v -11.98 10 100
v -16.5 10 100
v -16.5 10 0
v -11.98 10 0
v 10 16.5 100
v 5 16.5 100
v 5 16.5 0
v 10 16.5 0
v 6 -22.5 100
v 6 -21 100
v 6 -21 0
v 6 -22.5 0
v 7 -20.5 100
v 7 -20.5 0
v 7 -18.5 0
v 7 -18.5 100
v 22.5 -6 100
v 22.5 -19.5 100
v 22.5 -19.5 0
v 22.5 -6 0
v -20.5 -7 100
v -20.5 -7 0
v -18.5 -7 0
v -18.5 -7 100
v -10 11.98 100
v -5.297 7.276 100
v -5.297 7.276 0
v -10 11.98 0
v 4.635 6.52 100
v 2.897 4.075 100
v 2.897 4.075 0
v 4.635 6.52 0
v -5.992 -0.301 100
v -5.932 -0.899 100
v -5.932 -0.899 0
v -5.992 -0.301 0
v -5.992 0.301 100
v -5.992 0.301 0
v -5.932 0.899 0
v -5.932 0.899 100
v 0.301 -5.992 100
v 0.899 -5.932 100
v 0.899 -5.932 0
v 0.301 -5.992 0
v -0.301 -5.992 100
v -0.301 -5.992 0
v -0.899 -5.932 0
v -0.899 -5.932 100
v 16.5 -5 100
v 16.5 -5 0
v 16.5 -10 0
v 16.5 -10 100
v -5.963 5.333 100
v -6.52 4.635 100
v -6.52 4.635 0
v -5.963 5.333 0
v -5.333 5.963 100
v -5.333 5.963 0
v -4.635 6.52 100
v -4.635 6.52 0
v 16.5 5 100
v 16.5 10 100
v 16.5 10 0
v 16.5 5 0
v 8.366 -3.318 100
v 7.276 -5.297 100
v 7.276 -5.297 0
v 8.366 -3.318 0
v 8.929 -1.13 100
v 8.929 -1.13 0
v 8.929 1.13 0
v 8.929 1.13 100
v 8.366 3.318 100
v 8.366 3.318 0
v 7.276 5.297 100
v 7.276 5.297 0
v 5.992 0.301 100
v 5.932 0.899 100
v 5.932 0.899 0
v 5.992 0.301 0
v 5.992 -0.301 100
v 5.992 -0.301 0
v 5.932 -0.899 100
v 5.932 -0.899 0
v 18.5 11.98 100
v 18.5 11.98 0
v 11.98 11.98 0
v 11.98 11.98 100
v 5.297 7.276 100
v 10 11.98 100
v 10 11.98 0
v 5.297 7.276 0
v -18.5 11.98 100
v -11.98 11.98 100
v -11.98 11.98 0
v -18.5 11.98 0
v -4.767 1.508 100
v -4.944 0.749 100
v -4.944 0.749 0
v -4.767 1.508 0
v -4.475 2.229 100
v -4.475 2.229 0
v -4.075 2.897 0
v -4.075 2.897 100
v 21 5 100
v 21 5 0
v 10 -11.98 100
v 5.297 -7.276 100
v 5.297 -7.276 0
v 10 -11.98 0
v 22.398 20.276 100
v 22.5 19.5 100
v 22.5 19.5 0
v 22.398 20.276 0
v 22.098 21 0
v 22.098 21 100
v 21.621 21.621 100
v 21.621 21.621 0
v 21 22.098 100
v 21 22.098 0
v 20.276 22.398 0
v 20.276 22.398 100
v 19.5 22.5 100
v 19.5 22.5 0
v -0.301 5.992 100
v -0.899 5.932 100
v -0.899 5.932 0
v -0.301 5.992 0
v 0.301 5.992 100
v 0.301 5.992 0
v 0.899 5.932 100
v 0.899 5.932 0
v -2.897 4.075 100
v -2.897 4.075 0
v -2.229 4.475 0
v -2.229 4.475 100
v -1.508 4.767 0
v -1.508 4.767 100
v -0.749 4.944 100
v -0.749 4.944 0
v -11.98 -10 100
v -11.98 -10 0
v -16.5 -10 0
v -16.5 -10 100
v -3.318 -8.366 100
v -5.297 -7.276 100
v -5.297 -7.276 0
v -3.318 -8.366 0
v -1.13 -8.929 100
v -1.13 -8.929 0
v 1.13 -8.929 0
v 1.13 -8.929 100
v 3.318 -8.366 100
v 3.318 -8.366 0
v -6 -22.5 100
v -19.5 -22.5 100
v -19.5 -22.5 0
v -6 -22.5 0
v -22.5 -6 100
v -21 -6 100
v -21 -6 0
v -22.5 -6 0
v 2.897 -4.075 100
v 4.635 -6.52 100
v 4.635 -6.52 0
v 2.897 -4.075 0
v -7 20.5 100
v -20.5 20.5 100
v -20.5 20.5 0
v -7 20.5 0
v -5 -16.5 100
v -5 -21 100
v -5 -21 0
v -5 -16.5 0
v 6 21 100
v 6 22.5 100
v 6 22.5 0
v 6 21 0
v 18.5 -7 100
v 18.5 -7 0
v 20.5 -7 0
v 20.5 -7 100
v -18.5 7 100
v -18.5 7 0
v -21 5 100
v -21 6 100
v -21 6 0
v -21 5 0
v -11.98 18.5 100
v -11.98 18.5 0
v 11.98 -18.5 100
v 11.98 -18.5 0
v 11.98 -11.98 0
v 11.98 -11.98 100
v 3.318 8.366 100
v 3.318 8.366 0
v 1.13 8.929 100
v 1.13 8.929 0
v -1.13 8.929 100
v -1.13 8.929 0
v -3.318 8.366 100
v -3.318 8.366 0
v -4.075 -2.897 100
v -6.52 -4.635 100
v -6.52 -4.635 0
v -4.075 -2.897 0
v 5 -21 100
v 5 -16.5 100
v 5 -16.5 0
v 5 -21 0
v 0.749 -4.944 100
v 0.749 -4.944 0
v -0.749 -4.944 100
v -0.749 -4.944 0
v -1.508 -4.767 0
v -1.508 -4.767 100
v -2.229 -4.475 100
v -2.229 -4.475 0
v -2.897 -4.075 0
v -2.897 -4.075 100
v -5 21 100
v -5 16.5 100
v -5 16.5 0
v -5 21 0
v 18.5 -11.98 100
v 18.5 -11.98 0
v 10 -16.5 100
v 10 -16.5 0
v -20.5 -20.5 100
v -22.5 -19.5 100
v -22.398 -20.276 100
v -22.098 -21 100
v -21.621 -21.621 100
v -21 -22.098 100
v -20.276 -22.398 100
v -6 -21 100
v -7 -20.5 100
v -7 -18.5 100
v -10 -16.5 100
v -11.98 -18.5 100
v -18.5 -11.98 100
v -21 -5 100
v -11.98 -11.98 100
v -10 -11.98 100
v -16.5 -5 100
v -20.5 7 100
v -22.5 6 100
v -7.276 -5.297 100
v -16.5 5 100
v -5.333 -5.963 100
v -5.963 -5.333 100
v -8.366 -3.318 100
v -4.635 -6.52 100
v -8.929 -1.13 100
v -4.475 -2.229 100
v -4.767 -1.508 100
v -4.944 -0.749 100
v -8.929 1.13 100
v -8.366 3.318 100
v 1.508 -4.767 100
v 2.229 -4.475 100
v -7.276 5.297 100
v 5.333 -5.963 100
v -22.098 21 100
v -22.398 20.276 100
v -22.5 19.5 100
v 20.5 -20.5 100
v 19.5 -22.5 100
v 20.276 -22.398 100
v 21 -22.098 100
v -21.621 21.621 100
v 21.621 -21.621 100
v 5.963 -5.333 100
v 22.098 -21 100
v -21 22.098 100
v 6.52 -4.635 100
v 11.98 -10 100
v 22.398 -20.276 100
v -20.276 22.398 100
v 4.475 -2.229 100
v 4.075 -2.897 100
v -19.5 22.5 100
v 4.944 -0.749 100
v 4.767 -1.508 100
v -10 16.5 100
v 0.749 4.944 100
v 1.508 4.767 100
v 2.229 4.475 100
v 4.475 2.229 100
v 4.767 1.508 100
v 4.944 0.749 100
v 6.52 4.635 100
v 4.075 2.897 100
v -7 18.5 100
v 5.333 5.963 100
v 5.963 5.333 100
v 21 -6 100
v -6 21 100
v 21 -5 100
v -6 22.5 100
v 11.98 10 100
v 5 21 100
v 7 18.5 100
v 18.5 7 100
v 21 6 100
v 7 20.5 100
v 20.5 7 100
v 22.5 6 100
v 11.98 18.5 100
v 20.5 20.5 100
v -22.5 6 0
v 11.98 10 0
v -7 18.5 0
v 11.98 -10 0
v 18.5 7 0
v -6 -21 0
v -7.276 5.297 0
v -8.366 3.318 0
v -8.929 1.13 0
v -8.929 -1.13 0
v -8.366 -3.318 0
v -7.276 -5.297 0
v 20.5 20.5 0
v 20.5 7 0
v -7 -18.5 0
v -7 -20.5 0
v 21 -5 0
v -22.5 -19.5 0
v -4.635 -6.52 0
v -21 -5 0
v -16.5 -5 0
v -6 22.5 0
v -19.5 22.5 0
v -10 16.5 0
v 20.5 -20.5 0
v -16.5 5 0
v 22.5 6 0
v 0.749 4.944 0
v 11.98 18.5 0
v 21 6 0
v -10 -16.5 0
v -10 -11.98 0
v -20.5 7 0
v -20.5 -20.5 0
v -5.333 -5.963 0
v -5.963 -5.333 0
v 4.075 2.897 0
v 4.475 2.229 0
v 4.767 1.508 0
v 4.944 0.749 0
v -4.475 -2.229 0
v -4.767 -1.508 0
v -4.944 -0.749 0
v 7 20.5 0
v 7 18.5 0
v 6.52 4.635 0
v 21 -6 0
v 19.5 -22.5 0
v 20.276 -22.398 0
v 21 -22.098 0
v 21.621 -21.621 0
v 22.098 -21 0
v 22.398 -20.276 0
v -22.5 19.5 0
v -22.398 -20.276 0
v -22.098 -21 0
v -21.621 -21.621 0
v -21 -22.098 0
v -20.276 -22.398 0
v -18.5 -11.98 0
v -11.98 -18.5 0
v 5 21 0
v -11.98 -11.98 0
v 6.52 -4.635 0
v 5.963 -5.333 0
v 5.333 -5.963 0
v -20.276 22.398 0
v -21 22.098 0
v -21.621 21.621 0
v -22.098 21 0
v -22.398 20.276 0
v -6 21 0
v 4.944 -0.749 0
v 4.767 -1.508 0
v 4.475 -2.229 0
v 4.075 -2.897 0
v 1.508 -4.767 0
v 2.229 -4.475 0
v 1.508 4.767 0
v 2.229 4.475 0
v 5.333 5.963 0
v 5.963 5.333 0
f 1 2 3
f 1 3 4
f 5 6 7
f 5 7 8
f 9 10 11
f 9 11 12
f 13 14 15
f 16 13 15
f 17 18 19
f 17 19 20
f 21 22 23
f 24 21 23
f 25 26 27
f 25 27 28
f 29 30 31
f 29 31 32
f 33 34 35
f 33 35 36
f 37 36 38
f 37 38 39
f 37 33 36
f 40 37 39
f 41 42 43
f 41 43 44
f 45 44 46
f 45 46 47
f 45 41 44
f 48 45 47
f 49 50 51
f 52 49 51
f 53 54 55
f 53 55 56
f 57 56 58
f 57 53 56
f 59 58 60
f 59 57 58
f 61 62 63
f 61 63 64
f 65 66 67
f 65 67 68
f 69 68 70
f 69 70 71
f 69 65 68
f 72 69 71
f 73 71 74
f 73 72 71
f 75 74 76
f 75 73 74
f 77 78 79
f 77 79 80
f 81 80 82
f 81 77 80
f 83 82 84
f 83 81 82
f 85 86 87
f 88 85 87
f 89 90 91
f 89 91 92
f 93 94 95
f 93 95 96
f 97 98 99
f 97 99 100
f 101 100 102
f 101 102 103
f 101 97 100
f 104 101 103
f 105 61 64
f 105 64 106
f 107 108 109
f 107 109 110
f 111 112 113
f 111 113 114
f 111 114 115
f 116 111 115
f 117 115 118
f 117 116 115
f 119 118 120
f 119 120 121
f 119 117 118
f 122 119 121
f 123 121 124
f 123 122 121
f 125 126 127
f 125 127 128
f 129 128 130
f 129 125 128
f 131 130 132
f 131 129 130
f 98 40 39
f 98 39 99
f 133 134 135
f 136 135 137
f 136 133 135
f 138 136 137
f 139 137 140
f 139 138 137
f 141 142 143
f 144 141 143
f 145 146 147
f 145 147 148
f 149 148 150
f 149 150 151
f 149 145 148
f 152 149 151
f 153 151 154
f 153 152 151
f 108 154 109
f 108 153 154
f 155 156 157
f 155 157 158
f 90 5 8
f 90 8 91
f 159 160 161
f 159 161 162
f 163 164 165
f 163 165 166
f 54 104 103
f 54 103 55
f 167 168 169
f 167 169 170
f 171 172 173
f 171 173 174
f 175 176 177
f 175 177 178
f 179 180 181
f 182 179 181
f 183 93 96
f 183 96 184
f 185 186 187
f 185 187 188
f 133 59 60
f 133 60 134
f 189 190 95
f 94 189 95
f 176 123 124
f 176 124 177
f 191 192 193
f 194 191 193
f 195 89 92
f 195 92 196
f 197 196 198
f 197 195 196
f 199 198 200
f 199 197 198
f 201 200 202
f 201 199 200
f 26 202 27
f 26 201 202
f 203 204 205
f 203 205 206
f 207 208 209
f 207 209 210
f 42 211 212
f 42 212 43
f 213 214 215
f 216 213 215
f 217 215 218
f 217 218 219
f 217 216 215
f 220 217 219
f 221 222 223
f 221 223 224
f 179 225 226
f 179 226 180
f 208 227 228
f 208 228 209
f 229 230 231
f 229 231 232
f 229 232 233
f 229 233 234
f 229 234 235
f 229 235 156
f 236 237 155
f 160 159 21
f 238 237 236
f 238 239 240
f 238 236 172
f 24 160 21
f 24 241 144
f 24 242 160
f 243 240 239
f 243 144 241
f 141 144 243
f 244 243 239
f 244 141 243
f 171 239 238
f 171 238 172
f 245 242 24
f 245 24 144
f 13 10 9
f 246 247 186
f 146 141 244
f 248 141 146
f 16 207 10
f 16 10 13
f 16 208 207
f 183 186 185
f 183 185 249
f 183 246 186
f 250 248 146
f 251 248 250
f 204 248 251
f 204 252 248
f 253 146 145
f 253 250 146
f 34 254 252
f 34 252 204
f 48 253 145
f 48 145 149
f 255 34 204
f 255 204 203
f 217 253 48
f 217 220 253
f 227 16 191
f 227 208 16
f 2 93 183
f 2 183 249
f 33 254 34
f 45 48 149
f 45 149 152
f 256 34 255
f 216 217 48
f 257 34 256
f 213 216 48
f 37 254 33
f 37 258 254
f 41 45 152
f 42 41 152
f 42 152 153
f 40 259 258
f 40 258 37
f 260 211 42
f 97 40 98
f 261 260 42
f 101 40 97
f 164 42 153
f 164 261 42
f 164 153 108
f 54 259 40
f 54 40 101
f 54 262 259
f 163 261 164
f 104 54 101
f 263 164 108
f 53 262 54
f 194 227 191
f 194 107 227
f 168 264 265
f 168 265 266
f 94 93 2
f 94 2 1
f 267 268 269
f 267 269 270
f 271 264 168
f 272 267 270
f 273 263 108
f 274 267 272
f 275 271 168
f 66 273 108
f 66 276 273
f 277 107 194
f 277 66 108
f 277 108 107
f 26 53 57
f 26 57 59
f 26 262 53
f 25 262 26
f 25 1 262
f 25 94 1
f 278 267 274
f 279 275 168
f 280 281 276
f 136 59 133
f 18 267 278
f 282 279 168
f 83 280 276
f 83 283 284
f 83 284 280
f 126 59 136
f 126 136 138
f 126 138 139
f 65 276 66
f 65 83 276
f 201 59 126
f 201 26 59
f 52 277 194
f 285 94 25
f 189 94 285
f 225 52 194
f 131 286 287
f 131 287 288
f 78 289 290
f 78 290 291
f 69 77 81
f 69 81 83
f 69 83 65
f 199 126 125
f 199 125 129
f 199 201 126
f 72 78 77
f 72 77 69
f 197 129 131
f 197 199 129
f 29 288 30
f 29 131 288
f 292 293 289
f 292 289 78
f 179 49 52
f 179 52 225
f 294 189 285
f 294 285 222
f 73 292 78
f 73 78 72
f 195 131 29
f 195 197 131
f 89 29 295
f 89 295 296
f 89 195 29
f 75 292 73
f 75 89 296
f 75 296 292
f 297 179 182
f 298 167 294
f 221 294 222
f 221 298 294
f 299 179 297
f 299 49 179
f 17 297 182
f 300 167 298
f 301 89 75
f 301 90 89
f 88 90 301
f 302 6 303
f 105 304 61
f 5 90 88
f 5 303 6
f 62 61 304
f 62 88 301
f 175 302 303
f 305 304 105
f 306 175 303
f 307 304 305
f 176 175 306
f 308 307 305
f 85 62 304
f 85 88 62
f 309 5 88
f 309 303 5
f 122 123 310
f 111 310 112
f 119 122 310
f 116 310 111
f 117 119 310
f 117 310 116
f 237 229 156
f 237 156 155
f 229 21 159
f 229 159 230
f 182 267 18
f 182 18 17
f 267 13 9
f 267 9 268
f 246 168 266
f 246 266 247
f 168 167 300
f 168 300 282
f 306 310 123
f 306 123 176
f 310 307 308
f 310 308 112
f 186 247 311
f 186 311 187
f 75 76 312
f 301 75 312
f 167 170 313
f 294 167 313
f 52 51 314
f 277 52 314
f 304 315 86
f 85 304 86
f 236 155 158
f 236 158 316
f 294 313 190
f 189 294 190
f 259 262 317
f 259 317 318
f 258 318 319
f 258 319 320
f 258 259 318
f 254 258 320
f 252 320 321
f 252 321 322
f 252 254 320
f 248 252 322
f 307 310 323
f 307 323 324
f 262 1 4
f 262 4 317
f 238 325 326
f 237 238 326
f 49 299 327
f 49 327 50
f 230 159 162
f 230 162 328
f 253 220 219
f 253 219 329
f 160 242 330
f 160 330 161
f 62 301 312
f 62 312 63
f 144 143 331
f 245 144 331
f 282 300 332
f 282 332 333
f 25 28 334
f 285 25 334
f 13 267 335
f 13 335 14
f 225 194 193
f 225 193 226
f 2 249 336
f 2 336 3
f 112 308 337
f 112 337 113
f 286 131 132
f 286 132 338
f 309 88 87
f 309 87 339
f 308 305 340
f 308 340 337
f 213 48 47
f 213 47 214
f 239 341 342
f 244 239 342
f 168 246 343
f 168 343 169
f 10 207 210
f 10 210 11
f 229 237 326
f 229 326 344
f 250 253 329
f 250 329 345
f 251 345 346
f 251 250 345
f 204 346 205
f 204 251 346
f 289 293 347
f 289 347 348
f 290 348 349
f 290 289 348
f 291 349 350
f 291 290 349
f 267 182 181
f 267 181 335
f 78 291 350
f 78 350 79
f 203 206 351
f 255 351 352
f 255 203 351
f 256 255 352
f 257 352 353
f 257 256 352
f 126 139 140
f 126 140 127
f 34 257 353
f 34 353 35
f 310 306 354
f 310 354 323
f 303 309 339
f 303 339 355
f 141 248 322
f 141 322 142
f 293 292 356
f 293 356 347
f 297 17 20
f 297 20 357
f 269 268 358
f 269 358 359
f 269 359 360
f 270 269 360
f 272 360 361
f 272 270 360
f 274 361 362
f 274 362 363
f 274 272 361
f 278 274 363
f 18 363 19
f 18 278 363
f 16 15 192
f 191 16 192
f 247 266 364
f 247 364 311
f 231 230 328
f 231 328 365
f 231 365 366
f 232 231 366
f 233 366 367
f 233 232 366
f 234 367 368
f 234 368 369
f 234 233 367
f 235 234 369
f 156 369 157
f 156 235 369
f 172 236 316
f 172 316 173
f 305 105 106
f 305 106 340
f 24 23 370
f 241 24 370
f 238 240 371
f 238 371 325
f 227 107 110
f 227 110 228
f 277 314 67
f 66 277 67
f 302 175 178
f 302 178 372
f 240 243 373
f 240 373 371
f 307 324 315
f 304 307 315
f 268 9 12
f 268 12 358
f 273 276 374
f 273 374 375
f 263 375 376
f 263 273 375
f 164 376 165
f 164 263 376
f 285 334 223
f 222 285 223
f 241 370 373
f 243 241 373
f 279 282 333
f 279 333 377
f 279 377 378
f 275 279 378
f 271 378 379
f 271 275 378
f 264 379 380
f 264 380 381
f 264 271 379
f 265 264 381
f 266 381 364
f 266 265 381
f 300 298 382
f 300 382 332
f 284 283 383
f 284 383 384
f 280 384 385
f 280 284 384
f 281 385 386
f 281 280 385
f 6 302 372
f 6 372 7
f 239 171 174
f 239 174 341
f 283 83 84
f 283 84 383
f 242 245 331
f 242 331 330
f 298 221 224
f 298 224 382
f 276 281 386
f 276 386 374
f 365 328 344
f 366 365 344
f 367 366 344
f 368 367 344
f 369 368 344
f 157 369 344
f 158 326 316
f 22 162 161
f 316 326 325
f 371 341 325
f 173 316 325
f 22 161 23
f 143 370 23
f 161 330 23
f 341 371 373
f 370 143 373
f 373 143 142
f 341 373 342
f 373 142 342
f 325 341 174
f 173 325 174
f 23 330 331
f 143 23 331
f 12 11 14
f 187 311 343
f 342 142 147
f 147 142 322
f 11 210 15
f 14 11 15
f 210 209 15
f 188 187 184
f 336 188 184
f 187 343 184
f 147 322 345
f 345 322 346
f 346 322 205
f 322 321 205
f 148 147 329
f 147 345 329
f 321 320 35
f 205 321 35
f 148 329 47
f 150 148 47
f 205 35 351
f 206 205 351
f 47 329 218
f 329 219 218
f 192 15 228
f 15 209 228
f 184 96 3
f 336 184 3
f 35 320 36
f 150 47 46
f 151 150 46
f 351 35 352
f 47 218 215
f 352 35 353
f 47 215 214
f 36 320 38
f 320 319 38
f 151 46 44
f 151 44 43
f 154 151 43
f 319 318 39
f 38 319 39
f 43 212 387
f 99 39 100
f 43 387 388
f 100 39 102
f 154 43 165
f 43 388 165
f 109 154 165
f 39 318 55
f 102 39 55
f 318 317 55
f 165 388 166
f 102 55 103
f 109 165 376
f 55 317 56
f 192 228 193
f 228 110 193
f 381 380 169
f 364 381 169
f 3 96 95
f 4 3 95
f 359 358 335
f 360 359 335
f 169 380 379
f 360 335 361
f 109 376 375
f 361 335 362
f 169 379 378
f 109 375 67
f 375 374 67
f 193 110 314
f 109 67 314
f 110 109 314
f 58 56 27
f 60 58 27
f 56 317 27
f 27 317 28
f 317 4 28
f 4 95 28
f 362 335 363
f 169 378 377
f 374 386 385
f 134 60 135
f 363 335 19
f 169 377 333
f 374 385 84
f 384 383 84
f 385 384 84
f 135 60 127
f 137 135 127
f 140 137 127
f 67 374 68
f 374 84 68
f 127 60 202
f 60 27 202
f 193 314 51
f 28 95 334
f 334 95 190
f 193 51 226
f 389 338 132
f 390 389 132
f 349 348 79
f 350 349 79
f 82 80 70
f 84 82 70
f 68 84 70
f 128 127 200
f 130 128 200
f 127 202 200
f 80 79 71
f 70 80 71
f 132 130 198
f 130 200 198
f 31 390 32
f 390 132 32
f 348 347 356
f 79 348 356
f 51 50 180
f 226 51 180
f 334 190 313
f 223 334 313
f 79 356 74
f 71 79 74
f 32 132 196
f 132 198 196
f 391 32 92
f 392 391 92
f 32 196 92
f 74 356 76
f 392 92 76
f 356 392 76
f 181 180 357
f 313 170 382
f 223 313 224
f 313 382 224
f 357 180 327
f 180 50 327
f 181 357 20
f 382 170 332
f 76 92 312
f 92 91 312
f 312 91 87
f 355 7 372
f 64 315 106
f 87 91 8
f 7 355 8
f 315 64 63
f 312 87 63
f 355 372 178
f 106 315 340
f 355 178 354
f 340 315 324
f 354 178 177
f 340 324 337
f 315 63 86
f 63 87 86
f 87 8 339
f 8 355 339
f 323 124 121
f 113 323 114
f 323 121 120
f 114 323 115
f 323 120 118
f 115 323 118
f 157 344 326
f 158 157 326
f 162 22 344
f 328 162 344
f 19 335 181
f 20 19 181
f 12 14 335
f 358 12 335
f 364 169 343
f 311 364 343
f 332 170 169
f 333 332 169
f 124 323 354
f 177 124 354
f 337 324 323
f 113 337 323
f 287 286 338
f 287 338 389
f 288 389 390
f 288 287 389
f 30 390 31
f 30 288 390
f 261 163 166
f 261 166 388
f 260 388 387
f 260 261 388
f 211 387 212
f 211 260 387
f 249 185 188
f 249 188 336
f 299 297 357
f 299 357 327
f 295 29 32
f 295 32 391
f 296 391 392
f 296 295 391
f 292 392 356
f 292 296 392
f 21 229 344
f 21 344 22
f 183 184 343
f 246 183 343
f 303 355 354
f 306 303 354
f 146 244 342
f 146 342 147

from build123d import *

# Parameters (mm, degrees)
Y_KSEKLIK_EKSTR_ZYON1_DEPTH = 100


with BuildPart() as part:
    # Çizim1 → Yükseklik-Ekstrüzyon1 (new body)
    with BuildSketch(Plane.XY.offset(100)):
        with BuildLine():
            Line((5, -21), (6, -21))
            Line((6, -21), (6, -22.5))
            Line((6, -22.5), (19.5, -22.5))
            ThreePointArc((19.5, -22.5), (21.621320344, -21.621320344), (22.5, -19.5))
            Line((22.5, -19.5), (22.5, -6))
            Line((22.5, -6), (21, -6))
            Line((21, -6), (21, -5))
            Line((21, -5), (16.499999999, -5))
            Line((16.499999999, -5), (16.499999999, -10.000000002))
            Line((16.499999999, -10.000000002), (11.979898986, -10.000000002))
            Line((11.979898986, -10.000000002), (7.27644295, -5.296543966))
            ThreePointArc((7.27644295, -5.296543966), (8.999999998, -2e-09), (7.27644295, 5.296543963))
            Line((7.27644295, 5.296543963), (11.979898987, 10))
            Line((11.979898987, 10), (16.499999999, 10))
            Line((16.499999999, 10), (16.499999999, 5))
            Line((16.499999999, 5), (21, 5))
            Line((21, 5), (21, 6))
            Line((21, 6), (22.5, 6))
            Line((22.5, 6), (22.5, 19.5))
            ThreePointArc((22.5, 19.5), (21.621320344, 21.621320344), (19.5, 22.5))
            Line((19.5, 22.5), (6, 22.5))
            Line((6, 22.5), (6, 21))
            Line((6, 21), (5, 21))
            Line((5, 21), (5, 16.499999998))
            Line((5, 16.499999998), (10, 16.499999998))
            Line((10, 16.499999998), (10, 11.979898987))
            Line((10, 11.979898987), (5.296543963, 7.27644295))
            ThreePointArc((5.296543963, 7.27644295), (-2e-09, 8.999999998), (-5.296543966, 7.27644295))
            Line((-5.296543966, 7.27644295), (-10.000000001, 11.979898985))
            Line((-10.000000001, 11.979898985), (-10.000000001, 16.499999998))
            Line((-10.000000001, 16.499999998), (-5, 16.499999998))
            Line((-5, 16.499999998), (-5, 21))
            Line((-5, 21), (-6, 21))
            Line((-6, 21), (-6, 22.5))
            Line((-6, 22.5), (-19.5, 22.5))
            ThreePointArc((-19.5, 22.5), (-21.621320344, 21.621320344), (-22.5, 19.5))
            Line((-22.5, 19.5), (-22.5, 6))
            Line((-22.5, 6), (-21, 6))
            Line((-21, 6), (-21, 5))
            Line((-21, 5), (-16.500000001, 5))
            Line((-16.500000001, 5), (-16.500000001, 10))
            Line((-16.500000001, 10), (-11.979898987, 10))
            Line((-11.979898987, 10), (-7.276442952, 5.296543965))
            ThreePointArc((-7.276442952, 5.296543965), (-9.000000001, -1e-09), (-7.276442953, -5.296543966))
            Line((-7.276442953, -5.296543966), (-11.979898988, -10.000000002))
            Line((-11.979898988, -10.000000002), (-16.500000001, -10.000000002))
            Line((-16.500000001, -10.000000002), (-16.500000001, -5))
            Line((-16.500000001, -5), (-21, -5))
            Line((-21, -5), (-21, -6))
            Line((-21, -6), (-22.5, -6))
            Line((-22.5, -6), (-22.5, -19.5))
            ThreePointArc((-22.5, -19.5), (-21.621320344, -21.621320344), (-19.5, -22.5))
            Line((-19.5, -22.5), (-6, -22.5))
            Line((-6, -22.5), (-6, -21))
            Line((-6, -21), (-5, -21))
            Line((-5, -21), (-5, -16.500000002))
            Line((-5, -16.500000002), (-10.000000001, -16.500000002))
            Line((-10.000000001, -16.500000002), (-10.000000001, -11.979898989))
            Line((-10.000000001, -11.979898989), (-5.296543966, -7.276442954))
            ThreePointArc((-5.296543966, -7.276442954), (0, -9.000000002), (5.296543965, -7.276442952))
            Line((5.296543965, -7.276442952), (10, -11.979898987))
            Line((10, -11.979898987), (10, -16.500000002))
            Line((10, -16.500000002), (5, -16.500000002))
            Line((5, -16.500000002), (5, -21))
        make_face()
        Polygon((-11.98, 18.500101013), (-11.98, 11.98), (-18.500101013, 11.98), (-18.500101013, 7.000101013), (-20.500101013, 7.000101013), (-20.500101013, 20.500101013), (-7.000101013, 20.500101013), (-7.000101013, 18.500101013), align=None, mode=Mode.SUBTRACT)
        Polygon((-18.500101013, -11.98), (-11.98, -11.98), (-11.98, -18.500101013), (-7.000101013, -18.500101013), (-7.000101013, -20.500101013), (-20.500101013, -20.500101013), (-20.500101013, -7.000101013), (-18.500101013, -7.000101013), align=None, mode=Mode.SUBTRACT)
        Polygon((11.98, -18.500101013), (11.98, -11.98), (18.500101013, -11.98), (18.500101013, -7.000101013), (20.500101013, -7.000101013), (20.500101013, -20.500101013), (7.000101013, -20.500101013), (7.000101013, -18.500101013), align=None, mode=Mode.SUBTRACT)
        Polygon((18.500101013, 11.98), (11.98, 11.98), (11.98, 18.500101013), (7.000101013, 18.500101013), (7.000101013, 20.500101013), (20.500101013, 20.500101013), (20.500101013, 7.000101013), (18.500101013, 7.000101013), align=None, mode=Mode.SUBTRACT)
        with BuildLine():
            Line((-6.52021344, -4.635387443), (-4.075133401, -2.897117152))
            ThreePointArc((-4.075133401, -2.897117152), (-4.635428757, -1.874246585), (-4.943520618, -0.749402378))
            Line((-4.943520618, -0.749402378), (-5.932224741, -0.899282854))
            ThreePointArc((-5.932224741, -0.899282854), (-6.000000002, -2e-09), (-5.932224741, 0.89928285))
            Line((-5.932224741, 0.89928285), (-4.943520618, 0.749402375))
            ThreePointArc((-4.943520618, 0.749402375), (-4.635428757, 1.874246582), (-4.0751334, 2.89711715))
            Line((-4.0751334, 2.89711715), (-6.520213439, 4.635387441))
            ThreePointArc((-6.520213439, 4.635387441), (-5.65685425, 5.656854249), (-4.635387441, 6.520213437))
            Line((-4.635387441, 6.520213437), (-2.897117152, 4.075133398))
            ThreePointArc((-2.897117152, 4.075133398), (-1.874246584, 4.635428754), (-0.749402378, 4.943520614))
            Line((-0.749402378, 4.943520614), (-0.899282853, 5.932224737))
            ThreePointArc((-0.899282853, 5.932224737), (-5e-09, 5.999999998), (0.899282844, 5.932224738))
            Line((0.899282844, 5.932224738), (0.74940237, 4.943520615))
            ThreePointArc((0.74940237, 4.943520615), (1.874246579, 4.635428755), (2.897117149, 4.075133397))
            Line((2.897117149, 4.075133397), (4.635387439, 6.520213436))
            ThreePointArc((4.635387439, 6.520213436), (5.656854248, 5.656854248), (6.520213436, 4.635387439))
            Line((6.520213436, 4.635387439), (4.075133397, 2.897117149))
            ThreePointArc((4.075133397, 2.897117149), (4.635428754, 1.874246581), (4.943520614, 0.749402374))
            Line((4.943520614, 0.749402374), (5.932224737, 0.89928285))
            ThreePointArc((5.932224737, 0.89928285), (5.999999998, -2e-09), (5.932224737, -0.899282854))
            Line((5.932224737, -0.899282854), (4.943520614, -0.749402379))
            ThreePointArc((4.943520614, -0.749402379), (4.635428753, -1.874246586), (4.075133396, -2.897117154))
            Line((4.075133396, -2.897117154), (6.520213435, -4.635387445))
            ThreePointArc((6.520213435, -4.635387445), (5.656854247, -5.656854253), (4.635387438, -6.520213441))
            Line((4.635387438, -6.520213441), (2.897117148, -4.075133401))
            ThreePointArc((2.897117148, -4.075133401), (1.874246581, -4.635428758), (0.749402374, -4.943520618))
            Line((0.749402374, -4.943520618), (0.899282849, -5.932224741))
            ThreePointArc((0.899282849, -5.932224741), (1e-09, -6.000000002), (-0.899282847, -5.932224742))
            Line((-0.899282847, -5.932224742), (-0.749402373, -4.943520619))
            ThreePointArc((-0.749402373, -4.943520619), (-1.874246583, -4.635428758), (-2.897117153, -4.075133401))
            Line((-2.897117153, -4.075133401), (-4.635387443, -6.52021344))
            ThreePointArc((-4.635387443, -6.52021344), (-5.656854252, -5.656854251), (-6.52021344, -4.635387443))
        make_face(mode=Mode.SUBTRACT)
    extrude(amount=-Y_KSEKLIK_EKSTR_ZYON1_DEPTH)


solid = part.part
